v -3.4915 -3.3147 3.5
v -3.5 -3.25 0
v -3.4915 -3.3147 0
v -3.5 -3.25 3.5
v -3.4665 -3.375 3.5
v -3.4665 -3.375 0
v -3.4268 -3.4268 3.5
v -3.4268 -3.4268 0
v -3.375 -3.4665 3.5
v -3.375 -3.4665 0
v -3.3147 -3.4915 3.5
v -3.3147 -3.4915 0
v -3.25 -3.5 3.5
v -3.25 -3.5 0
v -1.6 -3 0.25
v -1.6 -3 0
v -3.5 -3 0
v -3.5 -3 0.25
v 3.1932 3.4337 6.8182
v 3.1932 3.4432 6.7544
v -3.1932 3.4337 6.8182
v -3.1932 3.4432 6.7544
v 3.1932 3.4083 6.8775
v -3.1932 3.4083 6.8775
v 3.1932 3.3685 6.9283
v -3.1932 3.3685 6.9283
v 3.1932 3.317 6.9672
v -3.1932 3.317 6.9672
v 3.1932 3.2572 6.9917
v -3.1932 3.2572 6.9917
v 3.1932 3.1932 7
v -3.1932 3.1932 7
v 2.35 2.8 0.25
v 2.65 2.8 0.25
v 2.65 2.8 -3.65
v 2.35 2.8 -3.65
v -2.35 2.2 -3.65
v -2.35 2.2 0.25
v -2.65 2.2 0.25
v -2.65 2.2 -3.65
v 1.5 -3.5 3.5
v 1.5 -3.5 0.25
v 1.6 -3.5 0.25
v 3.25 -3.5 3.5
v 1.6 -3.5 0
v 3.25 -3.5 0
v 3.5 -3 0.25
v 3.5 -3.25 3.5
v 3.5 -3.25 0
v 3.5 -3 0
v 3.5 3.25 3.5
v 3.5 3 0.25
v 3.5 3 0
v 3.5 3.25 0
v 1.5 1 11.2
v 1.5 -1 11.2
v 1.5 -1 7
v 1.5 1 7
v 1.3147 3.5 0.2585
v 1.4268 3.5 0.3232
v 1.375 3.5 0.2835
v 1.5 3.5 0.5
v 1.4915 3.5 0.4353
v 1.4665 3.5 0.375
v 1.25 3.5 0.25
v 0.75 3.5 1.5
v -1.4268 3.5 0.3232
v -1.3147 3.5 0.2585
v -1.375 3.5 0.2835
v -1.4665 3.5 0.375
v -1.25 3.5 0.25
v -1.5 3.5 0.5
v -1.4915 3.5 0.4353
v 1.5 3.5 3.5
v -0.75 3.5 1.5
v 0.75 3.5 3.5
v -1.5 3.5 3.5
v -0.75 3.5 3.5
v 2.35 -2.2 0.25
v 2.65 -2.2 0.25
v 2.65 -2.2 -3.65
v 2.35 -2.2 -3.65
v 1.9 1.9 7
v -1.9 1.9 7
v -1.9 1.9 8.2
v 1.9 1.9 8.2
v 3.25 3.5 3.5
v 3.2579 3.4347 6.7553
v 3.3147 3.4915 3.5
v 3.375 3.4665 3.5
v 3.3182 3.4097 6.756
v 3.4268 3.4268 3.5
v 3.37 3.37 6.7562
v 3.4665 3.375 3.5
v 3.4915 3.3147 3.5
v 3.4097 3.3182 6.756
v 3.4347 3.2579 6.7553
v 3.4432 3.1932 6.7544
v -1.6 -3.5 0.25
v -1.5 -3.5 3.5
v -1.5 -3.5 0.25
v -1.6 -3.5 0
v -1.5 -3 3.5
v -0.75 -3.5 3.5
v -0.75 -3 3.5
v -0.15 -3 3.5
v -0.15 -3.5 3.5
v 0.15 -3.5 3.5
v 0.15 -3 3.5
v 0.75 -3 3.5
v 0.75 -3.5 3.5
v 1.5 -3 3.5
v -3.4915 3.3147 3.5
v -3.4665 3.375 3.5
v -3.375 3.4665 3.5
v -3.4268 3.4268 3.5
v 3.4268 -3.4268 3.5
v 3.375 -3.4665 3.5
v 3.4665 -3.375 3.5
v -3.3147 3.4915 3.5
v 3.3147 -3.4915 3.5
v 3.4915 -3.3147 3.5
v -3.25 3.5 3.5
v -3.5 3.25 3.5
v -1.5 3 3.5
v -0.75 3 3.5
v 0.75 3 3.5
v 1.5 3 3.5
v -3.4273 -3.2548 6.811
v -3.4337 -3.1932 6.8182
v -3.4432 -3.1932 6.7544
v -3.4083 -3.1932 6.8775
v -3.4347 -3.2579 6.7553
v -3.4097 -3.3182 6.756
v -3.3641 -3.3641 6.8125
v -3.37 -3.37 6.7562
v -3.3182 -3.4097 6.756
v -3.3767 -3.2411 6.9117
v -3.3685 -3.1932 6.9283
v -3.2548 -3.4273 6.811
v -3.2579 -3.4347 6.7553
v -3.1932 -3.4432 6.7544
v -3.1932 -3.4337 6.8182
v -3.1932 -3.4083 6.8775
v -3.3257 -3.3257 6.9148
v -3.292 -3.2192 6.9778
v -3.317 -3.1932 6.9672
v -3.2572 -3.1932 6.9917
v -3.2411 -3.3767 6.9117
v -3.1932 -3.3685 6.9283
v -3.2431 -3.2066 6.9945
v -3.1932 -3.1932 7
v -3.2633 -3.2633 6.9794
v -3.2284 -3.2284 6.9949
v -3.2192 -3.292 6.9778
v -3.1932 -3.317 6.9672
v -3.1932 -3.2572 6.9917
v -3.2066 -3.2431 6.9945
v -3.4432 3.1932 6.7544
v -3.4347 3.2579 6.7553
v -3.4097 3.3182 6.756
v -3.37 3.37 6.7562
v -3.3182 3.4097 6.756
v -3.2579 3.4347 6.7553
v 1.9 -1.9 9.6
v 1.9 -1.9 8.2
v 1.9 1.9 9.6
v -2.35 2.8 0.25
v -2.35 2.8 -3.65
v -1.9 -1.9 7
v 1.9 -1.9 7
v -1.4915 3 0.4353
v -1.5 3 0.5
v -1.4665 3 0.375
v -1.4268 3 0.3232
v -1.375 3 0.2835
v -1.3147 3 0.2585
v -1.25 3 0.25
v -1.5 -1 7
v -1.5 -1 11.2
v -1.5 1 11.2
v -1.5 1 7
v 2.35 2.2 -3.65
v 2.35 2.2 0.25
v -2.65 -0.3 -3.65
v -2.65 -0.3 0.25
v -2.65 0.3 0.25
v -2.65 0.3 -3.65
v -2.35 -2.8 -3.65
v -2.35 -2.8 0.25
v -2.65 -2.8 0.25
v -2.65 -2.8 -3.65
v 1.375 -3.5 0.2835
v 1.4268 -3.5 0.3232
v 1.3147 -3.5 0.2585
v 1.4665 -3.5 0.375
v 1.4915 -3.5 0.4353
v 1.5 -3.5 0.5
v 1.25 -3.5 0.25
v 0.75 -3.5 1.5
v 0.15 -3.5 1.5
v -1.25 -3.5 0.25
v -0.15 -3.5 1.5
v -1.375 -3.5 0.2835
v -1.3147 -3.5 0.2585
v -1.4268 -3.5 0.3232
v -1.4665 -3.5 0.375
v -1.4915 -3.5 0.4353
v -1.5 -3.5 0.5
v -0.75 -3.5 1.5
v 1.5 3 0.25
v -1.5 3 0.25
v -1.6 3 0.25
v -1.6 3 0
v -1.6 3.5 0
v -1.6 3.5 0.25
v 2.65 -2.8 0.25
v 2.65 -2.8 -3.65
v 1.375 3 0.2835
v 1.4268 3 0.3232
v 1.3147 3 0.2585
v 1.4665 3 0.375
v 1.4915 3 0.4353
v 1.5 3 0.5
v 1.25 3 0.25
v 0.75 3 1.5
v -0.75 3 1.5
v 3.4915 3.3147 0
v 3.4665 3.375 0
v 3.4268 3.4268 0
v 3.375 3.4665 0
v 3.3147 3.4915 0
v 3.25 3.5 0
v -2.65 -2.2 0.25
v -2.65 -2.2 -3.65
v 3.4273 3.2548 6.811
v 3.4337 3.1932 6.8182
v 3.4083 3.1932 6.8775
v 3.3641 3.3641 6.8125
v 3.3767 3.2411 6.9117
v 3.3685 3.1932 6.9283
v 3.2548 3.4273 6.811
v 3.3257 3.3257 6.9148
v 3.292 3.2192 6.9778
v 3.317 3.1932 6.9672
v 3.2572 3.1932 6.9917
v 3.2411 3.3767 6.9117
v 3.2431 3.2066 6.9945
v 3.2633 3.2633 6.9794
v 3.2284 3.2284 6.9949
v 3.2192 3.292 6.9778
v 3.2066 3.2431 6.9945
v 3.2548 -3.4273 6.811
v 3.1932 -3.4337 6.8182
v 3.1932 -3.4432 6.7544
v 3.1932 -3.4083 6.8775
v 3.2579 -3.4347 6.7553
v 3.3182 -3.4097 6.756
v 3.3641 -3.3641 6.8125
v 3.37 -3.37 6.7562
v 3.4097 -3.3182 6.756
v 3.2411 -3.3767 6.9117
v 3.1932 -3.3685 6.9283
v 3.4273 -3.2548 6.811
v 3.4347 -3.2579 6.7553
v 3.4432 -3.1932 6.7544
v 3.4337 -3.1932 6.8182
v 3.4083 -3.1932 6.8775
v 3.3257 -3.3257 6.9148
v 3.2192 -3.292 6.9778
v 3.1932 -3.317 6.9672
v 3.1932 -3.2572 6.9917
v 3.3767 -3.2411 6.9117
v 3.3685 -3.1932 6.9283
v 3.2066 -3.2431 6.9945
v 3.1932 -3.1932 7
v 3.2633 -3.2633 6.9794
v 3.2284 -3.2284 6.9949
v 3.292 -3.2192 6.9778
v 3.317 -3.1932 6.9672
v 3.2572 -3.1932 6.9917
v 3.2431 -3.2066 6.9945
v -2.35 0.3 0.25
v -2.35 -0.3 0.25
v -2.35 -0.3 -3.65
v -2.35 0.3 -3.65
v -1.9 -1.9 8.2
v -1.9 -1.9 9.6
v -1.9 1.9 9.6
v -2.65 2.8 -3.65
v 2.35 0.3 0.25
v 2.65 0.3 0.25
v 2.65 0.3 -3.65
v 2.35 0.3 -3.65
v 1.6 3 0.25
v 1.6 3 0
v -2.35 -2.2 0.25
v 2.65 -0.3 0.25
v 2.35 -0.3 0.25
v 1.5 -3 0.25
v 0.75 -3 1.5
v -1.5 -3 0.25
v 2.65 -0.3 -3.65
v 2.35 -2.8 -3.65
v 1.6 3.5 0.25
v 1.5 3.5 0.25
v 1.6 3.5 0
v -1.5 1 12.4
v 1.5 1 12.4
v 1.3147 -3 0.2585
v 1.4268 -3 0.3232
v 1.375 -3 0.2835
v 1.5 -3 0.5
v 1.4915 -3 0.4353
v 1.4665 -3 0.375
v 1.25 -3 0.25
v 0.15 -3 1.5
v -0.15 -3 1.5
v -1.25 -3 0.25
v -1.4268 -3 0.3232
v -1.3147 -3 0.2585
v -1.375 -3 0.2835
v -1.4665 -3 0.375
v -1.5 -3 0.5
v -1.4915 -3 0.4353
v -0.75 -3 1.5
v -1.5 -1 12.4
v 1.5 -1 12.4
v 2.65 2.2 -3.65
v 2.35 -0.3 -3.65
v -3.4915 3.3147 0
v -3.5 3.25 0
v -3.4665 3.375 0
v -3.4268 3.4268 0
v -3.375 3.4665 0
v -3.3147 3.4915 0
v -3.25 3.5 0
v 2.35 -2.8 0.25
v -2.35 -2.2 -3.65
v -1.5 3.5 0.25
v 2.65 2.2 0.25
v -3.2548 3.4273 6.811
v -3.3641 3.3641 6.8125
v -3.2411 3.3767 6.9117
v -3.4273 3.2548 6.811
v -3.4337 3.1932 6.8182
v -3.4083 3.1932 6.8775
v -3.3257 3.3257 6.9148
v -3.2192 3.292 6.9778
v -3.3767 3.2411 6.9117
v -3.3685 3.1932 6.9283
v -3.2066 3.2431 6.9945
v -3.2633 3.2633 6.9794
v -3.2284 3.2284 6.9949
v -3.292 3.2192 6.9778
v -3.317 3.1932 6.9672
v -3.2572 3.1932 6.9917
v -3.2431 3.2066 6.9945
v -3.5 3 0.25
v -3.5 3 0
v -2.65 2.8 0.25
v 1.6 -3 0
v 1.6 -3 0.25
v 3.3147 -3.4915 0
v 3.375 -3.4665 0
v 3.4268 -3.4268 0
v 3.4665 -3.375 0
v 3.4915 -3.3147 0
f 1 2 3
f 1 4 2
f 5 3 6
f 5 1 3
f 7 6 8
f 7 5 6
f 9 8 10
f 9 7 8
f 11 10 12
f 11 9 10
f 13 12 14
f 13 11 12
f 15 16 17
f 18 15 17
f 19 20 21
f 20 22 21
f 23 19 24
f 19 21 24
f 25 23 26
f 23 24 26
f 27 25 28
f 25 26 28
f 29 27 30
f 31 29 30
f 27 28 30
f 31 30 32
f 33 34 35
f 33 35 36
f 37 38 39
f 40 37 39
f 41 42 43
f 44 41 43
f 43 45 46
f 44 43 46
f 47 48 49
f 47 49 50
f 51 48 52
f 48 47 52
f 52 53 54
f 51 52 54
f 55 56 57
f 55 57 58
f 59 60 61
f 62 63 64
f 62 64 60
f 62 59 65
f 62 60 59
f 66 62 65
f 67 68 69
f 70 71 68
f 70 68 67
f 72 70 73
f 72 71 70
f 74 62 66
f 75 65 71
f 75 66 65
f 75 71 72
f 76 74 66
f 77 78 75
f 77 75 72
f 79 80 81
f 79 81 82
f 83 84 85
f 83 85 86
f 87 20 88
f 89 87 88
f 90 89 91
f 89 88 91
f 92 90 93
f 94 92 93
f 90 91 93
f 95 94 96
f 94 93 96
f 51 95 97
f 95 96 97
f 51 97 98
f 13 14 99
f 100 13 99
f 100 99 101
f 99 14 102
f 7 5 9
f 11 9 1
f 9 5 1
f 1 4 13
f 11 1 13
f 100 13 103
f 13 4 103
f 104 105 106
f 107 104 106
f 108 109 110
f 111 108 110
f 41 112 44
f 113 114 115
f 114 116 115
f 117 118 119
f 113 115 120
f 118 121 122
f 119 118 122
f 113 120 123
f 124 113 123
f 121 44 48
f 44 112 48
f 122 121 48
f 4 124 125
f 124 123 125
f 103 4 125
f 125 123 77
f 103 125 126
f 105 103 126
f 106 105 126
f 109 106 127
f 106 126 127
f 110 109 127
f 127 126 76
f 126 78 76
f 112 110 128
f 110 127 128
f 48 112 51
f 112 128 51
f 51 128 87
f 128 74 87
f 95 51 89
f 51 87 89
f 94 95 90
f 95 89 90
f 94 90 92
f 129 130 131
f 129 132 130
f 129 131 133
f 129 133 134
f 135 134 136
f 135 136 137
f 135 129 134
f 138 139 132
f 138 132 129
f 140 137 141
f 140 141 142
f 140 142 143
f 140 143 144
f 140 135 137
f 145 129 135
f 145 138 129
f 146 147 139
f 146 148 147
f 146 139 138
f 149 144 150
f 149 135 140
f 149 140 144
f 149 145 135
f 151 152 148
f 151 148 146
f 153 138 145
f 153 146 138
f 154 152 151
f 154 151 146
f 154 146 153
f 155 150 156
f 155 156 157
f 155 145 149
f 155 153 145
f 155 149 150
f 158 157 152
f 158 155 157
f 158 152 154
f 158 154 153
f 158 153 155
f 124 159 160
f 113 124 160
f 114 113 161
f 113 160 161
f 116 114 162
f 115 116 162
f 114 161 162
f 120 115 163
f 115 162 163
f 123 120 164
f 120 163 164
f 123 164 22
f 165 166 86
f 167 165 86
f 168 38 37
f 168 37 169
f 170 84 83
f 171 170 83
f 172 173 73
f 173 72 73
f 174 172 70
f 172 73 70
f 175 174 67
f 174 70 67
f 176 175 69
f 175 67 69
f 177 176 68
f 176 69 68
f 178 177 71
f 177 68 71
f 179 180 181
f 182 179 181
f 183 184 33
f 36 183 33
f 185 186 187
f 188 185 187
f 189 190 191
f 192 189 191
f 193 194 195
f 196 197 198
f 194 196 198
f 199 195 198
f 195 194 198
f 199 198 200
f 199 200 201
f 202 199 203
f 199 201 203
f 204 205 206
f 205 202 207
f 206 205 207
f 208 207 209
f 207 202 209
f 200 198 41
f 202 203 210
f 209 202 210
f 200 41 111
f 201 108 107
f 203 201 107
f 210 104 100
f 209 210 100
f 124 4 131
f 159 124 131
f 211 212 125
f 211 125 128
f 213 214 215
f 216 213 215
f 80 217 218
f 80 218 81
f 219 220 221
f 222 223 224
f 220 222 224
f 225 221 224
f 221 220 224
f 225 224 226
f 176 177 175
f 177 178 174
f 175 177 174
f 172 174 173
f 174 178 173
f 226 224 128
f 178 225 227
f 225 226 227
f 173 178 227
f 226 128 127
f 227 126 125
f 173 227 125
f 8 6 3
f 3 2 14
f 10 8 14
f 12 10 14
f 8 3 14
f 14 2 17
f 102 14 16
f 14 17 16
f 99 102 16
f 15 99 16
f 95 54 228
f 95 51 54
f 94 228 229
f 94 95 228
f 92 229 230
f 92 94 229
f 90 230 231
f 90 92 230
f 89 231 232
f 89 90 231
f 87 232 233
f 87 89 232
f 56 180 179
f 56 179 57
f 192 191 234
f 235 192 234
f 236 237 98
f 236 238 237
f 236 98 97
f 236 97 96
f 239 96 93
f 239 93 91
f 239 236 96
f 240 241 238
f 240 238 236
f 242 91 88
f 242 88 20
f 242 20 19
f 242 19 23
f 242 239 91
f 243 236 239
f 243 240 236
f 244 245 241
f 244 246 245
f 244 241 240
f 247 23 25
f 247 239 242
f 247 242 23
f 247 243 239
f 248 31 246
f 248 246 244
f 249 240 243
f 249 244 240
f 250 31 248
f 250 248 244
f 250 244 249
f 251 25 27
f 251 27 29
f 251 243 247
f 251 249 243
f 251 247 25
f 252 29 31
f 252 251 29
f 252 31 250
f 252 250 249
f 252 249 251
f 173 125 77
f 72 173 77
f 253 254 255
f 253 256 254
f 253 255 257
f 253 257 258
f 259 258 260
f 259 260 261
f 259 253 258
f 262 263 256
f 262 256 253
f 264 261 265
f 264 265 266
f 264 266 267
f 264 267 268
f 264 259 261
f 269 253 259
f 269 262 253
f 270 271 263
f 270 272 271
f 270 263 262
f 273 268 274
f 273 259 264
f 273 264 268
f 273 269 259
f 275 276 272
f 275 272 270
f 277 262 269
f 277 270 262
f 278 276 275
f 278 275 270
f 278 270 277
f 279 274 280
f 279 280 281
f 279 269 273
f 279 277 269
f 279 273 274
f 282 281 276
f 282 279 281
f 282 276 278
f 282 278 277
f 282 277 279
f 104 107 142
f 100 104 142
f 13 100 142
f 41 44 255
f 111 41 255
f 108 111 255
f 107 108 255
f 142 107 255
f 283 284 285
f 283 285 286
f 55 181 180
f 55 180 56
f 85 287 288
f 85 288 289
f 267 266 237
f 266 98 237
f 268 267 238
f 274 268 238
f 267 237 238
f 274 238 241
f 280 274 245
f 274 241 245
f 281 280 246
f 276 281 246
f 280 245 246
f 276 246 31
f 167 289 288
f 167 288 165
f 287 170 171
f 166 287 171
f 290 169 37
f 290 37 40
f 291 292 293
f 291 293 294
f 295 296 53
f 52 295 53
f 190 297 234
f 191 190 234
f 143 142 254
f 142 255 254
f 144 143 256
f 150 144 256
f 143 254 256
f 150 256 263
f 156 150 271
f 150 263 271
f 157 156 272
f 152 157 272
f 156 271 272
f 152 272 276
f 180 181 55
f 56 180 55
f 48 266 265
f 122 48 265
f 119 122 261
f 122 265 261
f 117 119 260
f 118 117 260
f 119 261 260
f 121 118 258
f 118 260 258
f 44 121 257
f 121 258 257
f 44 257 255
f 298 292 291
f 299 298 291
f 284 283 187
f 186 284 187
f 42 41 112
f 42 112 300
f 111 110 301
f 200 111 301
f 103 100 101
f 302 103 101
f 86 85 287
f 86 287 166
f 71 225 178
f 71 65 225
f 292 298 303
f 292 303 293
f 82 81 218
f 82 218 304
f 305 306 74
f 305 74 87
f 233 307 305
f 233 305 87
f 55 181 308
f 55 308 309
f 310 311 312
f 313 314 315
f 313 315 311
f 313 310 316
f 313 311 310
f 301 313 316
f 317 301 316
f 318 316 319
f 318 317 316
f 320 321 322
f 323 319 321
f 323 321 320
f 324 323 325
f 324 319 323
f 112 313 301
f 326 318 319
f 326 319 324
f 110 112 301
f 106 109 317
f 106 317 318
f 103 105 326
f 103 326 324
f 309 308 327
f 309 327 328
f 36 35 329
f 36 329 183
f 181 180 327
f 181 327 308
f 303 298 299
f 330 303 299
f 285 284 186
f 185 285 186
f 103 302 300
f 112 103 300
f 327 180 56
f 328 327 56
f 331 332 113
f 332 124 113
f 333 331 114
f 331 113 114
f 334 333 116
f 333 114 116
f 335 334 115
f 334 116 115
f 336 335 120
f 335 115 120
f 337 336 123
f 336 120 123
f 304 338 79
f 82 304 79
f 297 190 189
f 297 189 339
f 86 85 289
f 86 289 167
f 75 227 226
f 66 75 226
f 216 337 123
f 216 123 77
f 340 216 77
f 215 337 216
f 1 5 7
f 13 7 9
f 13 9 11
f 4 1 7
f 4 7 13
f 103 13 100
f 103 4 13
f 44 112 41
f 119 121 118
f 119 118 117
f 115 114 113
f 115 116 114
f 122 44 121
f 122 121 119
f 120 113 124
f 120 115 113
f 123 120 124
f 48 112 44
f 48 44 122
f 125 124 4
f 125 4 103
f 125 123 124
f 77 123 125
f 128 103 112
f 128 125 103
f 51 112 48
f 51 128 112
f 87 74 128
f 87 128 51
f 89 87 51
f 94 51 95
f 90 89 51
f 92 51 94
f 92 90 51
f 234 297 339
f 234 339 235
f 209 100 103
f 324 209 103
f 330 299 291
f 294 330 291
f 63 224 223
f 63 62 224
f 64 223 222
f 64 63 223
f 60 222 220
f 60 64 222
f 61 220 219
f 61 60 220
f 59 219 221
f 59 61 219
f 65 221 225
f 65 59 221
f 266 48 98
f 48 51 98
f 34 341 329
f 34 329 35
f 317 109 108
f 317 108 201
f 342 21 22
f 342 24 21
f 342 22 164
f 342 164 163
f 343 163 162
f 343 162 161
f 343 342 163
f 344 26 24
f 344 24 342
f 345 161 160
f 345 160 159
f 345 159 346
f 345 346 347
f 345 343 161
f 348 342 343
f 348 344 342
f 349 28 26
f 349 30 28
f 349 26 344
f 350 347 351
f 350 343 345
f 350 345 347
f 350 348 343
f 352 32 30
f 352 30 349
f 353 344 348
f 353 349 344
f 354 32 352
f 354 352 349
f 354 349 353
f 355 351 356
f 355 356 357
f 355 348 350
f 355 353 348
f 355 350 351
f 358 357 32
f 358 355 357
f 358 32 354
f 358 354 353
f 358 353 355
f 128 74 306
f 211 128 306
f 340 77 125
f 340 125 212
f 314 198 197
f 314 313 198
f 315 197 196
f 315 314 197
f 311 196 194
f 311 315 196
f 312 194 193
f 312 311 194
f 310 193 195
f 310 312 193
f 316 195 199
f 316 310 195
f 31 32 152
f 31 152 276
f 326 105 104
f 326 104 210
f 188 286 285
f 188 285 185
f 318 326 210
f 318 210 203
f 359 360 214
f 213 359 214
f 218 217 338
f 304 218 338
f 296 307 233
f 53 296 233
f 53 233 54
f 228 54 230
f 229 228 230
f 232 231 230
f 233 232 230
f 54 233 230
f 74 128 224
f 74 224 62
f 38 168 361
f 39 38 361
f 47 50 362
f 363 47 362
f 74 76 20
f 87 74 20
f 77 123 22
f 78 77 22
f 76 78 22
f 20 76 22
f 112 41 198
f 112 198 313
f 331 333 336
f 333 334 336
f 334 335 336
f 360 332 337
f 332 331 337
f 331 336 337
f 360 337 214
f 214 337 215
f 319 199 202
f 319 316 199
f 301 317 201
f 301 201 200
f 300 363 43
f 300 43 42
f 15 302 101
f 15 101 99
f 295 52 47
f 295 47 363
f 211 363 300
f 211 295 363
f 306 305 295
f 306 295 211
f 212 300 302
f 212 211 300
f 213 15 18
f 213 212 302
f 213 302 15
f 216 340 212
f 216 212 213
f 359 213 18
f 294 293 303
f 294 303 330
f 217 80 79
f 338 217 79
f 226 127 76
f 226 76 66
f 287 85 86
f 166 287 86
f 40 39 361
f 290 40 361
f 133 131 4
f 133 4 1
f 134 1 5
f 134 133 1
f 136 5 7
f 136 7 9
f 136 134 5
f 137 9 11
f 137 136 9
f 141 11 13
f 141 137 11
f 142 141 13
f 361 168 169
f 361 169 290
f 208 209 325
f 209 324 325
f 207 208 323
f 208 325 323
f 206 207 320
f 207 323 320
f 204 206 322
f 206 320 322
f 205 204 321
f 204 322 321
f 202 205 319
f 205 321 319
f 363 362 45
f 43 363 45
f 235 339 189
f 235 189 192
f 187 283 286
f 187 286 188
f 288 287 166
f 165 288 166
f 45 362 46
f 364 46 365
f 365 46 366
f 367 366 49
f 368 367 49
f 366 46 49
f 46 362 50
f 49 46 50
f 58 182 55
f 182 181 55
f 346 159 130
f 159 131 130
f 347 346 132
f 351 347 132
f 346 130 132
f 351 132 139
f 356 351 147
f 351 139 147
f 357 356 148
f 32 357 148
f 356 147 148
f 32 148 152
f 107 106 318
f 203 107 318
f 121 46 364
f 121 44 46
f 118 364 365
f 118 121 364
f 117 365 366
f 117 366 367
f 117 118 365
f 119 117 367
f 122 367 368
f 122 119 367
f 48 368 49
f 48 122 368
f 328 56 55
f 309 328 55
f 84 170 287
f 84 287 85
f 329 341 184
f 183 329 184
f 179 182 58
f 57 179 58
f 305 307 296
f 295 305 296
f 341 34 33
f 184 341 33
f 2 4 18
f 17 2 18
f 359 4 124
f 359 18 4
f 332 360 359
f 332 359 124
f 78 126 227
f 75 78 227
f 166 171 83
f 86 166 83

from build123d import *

# Parameters (mm, degrees)
ESQUISSE1_W             = 7
ESQUISSE1_H             = 7
BOSS_EXTRU_1_DEPTH      = 3.5
ENL_V_MAT_EXTRU_1_DEPTH = 0.25
ESQUISSE3_W             = 3
ESQUISSE3_H             = 3.25
ENL_V_MAT_EXTRU_2_DEPTH = 0.5
ENL_V_START             = -7
ESQUISSE3_2_W           = 3
ESQUISSE3_2_H           = 3.25
ENL_V_MAT_EXTRU_3_DEPTH = 0.5
ESQUISSE4_W             = 7
ESQUISSE4_H             = 7
BOSS_EXTRU_2_DEPTH      = 3.5
BOSS_EXTRU_2_TAPER      = 1
ESQUISSE5_W             = 3
ESQUISSE5_H             = 0.5
BOSS_EXTRU_3_DEPTH      = 3.25
ESQUISSE8_W             = 1.5
ESQUISSE8_H             = 2
ENL_V_MAT_EXTRU_4_DEPTH = 4.5
ESQUISSE8_3_W           = 0.6
ESQUISSE8_3_H           = 2
ENL_V_MAT_EXTRU_5_DEPTH = 4.5
CONG_1_R                = 0.25
CONG_2_R                = 0.25
CONG_3_R                = 0.25
CONG_4_R                = 0.25
ESQUISSE6_W             = 3.8
ESQUISSE6_H             = 3.8
BOSS_EXTRU_4_DEPTH      = 1.2
BOSS_EXTRU_5_START      = 1.2
ESQUISSE6_3_W           = 3.8
ESQUISSE6_3_H           = 3.8
BOSS_EXTRU_5_DEPTH      = 1.4
ESQUISSE7_W             = 3
ESQUISSE7_H             = 2
BOSS_EXTRU_6_DEPTH      = 1.6
BOSS_EXTRU_6_DEPTH_BACK = 2.6
BOSS_EXTRU_7_START      = 1.6
ESQUISSE7_2_W           = 3
ESQUISSE7_2_H           = 2
BOSS_EXTRU_7_DEPTH      = 1.2
ESQUISSE9_W             = 0.3
ESQUISSE9_H             = 0.6
BOSS_EXTRU_8_DEPTH      = 3.9
BOSS_EXTRU_8_2_DEPTH    = 3.9
BOSS_EXTRU_8_3_DEPTH    = 3.9
BOSS_EXTRU_8_4_DEPTH    = 3.9
BOSS_EXTRU_8_5_DEPTH    = 3.9
BOSS_EXTRU_8_6_DEPTH    = 3.9


with BuildPart() as part:
    # Esquisse1 → Boss.-Extru.1 (new body)
    with BuildSketch(Plane.XY):
        Rectangle(ESQUISSE1_W, ESQUISSE1_H)
    extrude(amount=BOSS_EXTRU_1_DEPTH)

    # Esquisse2 → Enl_v. mat.-Extru.1 (cut)
    with BuildSketch(Plane(origin=(0, 0, 0), x_dir=(-1, 0, 0), z_dir=(0, 0, -1))):
        Polygon((1.6, 3.5), (-1.6, 3.5), (-1.6, 3), (-3.5, 3), (-3.5, -3), (-1.6, -3), (-1.6, -3.5), (1.6, -3.5), (1.6, -3), (3.5, -3), (3.5, 3), (1.6, 3), align=None)
    extrude(amount=-ENL_V_MAT_EXTRU_1_DEPTH, mode=Mode.SUBTRACT)

    # Esquisse3 → Enl_v. mat.-Extru.2 (cut)
    with BuildSketch(Plane(origin=(0, 3.5, 0), x_dir=(1, 0, 0), z_dir=(0, 1, 0))):
        with Locations((0, -1.875)):
            Rectangle(ESQUISSE3_W, ESQUISSE3_H)
    extrude(amount=-ENL_V_MAT_EXTRU_2_DEPTH, mode=Mode.SUBTRACT)

    # Esquisse3_2 → Enl_v. mat.-Extru.3 (cut)
    with BuildSketch(Plane(origin=(0, 3.5, 0), x_dir=(1, 0, 0), z_dir=(0, 1, 0)).offset(ENL_V_START)):
        with Locations((0, -1.875)):
            Rectangle(ESQUISSE3_2_W, ESQUISSE3_2_H)
    extrude(amount=ENL_V_MAT_EXTRU_3_DEPTH, mode=Mode.SUBTRACT)

    # Cong_1
    cong_1_edges = [part.edges().sort_by_distance(p)[0] for p in [
        (3.5, -3.5, 1.75),
        (-3.5, -3.5, 1.75),
        (-3.5, 3.5, 1.75),
        (3.5, 3.5, 1.75),
    ]]
    fillet(cong_1_edges, radius=CONG_1_R)


with BuildPart() as body_2:
    # Esquisse4 → Boss.-Extru.2 (new body)
    with BuildSketch(Plane.XY.offset(3.5)):
        Rectangle(ESQUISSE4_W, ESQUISSE4_H)
    extrude(amount=BOSS_EXTRU_2_DEPTH, taper=BOSS_EXTRU_2_TAPER)

    # Esquisse5 → Boss.-Extru.3 (add)
    with BuildSketch(Plane(origin=(0, 0, 3.5), x_dir=(-1, 0, 0), z_dir=(0, 0, -1))):
        with Locations((0, 3.25)):
            Rectangle(ESQUISSE5_W, ESQUISSE5_H)
        with Locations((0, -3.25)):
            Rectangle(ESQUISSE5_W, ESQUISSE5_H)
    extrude(amount=BOSS_EXTRU_3_DEPTH)

    # Esquisse8 → Enl_v. mat.-Extru.4 (cut, through all)
    with BuildSketch(Plane(origin=(0, 0, 0), x_dir=(1, 0, 0), z_dir=(0, 1, 0))):
        with Locations((0, -2.5)):
            Rectangle(ESQUISSE8_W, ESQUISSE8_H)
    extrude(amount=ENL_V_MAT_EXTRU_4_DEPTH, mode=Mode.SUBTRACT)

    # Esquisse8_3 → Enl_v. mat.-Extru.5 (cut, through all)
    with BuildSketch(Plane(origin=(0, 0, 0), x_dir=(1, 0, 0), z_dir=(0, 1, 0))):
        with Locations((0.45, -2.5)):
            Rectangle(ESQUISSE8_3_W, ESQUISSE8_3_H)
        with Locations((-0.45, -2.5)):
            Rectangle(ESQUISSE8_3_W, ESQUISSE8_3_H)
    extrude(amount=-ENL_V_MAT_EXTRU_5_DEPTH, mode=Mode.SUBTRACT)

    # Cong_2
    cong_2_edges = [body_2.edges().sort_by_distance(p)[0] for p in [
        (-3.469453636, 3.469453636, 5.25),
        (3.469453636, 3.469453636, 5.25),
        (3.469453636, -3.469453636, 5.25),
        (-3.469453636, -3.469453636, 5.25),
    ]]
    fillet(cong_2_edges, radius=CONG_2_R)

    # Cong_3
    cong_3_edges = [body_2.edges().sort_by_distance(p)[0] for p in [
        (0, 3.438907273, 7),
        (3.438907273, 0, 7),
        (-3.438907273, 0, 7),
        (0, -3.438907273, 7),
        (-3.365699738, 3.365699738, 7),
        (-3.365699738, -3.365699738, 7),
        (3.365699738, -3.365699738, 7),
        (3.365699738, 3.365699738, 7),
    ]]
    fillet(cong_3_edges, radius=CONG_3_R)

    # Cong_4
    cong_4_edges = [body_2.edges().sort_by_distance(p)[0] for p in [
        (1.5, 3.25, 0.25),
        (-1.5, 3.25, 0.25),
        (1.5, -3.25, 0.25),
        (-1.5, -3.25, 0.25),
    ]]
    fillet(cong_4_edges, radius=CONG_4_R)


with BuildPart() as body_3:
    # Esquisse6 → Boss.-Extru.4 (new body)
    with BuildSketch(Plane.XY.offset(7)):
        Rectangle(ESQUISSE6_W, ESQUISSE6_H)
    extrude(amount=BOSS_EXTRU_4_DEPTH)


with BuildPart() as body_4:
    # Esquisse6_3 → Boss.-Extru.5 (new body)
    with BuildSketch(Plane.XY.offset(7).offset(BOSS_EXTRU_5_START)):
        Rectangle(ESQUISSE6_3_W, ESQUISSE6_3_H)
    extrude(amount=BOSS_EXTRU_5_DEPTH)


with BuildPart() as body_5:
    # Esquisse7 → Boss.-Extru.6 (new body, two sides)
    with BuildSketch(Plane.XY.offset(9.6)) as boss_extru_6_sk:
        Rectangle(ESQUISSE7_W, ESQUISSE7_H)
    extrude(amount=BOSS_EXTRU_6_DEPTH)
    extrude(boss_extru_6_sk.sketch, amount=-BOSS_EXTRU_6_DEPTH_BACK)


with BuildPart() as body_6:
    # Esquisse7_2 → Boss.-Extru.7 (new body)
    with BuildSketch(Plane.XY.offset(9.6).offset(BOSS_EXTRU_7_START)):
        Rectangle(ESQUISSE7_2_W, ESQUISSE7_2_H)
    extrude(amount=BOSS_EXTRU_7_DEPTH)


with BuildPart() as body_7:
    # Esquisse9 → Boss.-Extru.8 (new body)
    with BuildSketch(Plane(origin=(0, 0, 0.25), x_dir=(-1, 0, 0), z_dir=(0, 0, -1))):
        with Locations((2.5, -2.5)):
            Rectangle(ESQUISSE9_W, ESQUISSE9_H)
    extrude(amount=BOSS_EXTRU_8_DEPTH)


with BuildPart() as body_8:
    # Esquisse9 → Boss.-Extru.8 2 (new body)
    with BuildSketch(Plane(origin=(0, 0, 0.25), x_dir=(-1, 0, 0), z_dir=(0, 0, -1))):
        with Locations((2.5, 0)):
            Rectangle(ESQUISSE9_W, ESQUISSE9_H)
    extrude(amount=BOSS_EXTRU_8_2_DEPTH)


with BuildPart() as body_9:
    # Esquisse9 → Boss.-Extru.8 3 (new body)
    with BuildSketch(Plane(origin=(0, 0, 0.25), x_dir=(-1, 0, 0), z_dir=(0, 0, -1))):
        with Locations((2.5, 2.5)):
            Rectangle(ESQUISSE9_W, ESQUISSE9_H)
    extrude(amount=BOSS_EXTRU_8_3_DEPTH)


with BuildPart() as body_10:
    # Esquisse9 → Boss.-Extru.8 4 (new body)
    with BuildSketch(Plane(origin=(0, 0, 0.25), x_dir=(-1, 0, 0), z_dir=(0, 0, -1))):
        with Locations((-2.5, 2.5)):
            Rectangle(ESQUISSE9_W, ESQUISSE9_H)
    extrude(amount=BOSS_EXTRU_8_4_DEPTH)


with BuildPart() as body_11:
    # Esquisse9 → Boss.-Extru.8 5 (new body)
    with BuildSketch(Plane(origin=(0, 0, 0.25), x_dir=(-1, 0, 0), z_dir=(0, 0, -1))):
        with Locations((-2.5, 0)):
            Rectangle(ESQUISSE9_W, ESQUISSE9_H)
    extrude(amount=BOSS_EXTRU_8_5_DEPTH)


with BuildPart() as body_12:
    # Esquisse9 → Boss.-Extru.8 6 (new body)
    with BuildSketch(Plane(origin=(0, 0, 0.25), x_dir=(-1, 0, 0), z_dir=(0, 0, -1))):
        with Locations((-2.5, -2.5)):
            Rectangle(ESQUISSE9_W, ESQUISSE9_H)
    extrude(amount=BOSS_EXTRU_8_6_DEPTH)


solid = Compound([part.part, body_2.part, body_3.part, body_4.part, body_5.part, body_6.part, body_7.part, body_8.part, body_9.part, body_10.part, body_11.part, body_12.part])
